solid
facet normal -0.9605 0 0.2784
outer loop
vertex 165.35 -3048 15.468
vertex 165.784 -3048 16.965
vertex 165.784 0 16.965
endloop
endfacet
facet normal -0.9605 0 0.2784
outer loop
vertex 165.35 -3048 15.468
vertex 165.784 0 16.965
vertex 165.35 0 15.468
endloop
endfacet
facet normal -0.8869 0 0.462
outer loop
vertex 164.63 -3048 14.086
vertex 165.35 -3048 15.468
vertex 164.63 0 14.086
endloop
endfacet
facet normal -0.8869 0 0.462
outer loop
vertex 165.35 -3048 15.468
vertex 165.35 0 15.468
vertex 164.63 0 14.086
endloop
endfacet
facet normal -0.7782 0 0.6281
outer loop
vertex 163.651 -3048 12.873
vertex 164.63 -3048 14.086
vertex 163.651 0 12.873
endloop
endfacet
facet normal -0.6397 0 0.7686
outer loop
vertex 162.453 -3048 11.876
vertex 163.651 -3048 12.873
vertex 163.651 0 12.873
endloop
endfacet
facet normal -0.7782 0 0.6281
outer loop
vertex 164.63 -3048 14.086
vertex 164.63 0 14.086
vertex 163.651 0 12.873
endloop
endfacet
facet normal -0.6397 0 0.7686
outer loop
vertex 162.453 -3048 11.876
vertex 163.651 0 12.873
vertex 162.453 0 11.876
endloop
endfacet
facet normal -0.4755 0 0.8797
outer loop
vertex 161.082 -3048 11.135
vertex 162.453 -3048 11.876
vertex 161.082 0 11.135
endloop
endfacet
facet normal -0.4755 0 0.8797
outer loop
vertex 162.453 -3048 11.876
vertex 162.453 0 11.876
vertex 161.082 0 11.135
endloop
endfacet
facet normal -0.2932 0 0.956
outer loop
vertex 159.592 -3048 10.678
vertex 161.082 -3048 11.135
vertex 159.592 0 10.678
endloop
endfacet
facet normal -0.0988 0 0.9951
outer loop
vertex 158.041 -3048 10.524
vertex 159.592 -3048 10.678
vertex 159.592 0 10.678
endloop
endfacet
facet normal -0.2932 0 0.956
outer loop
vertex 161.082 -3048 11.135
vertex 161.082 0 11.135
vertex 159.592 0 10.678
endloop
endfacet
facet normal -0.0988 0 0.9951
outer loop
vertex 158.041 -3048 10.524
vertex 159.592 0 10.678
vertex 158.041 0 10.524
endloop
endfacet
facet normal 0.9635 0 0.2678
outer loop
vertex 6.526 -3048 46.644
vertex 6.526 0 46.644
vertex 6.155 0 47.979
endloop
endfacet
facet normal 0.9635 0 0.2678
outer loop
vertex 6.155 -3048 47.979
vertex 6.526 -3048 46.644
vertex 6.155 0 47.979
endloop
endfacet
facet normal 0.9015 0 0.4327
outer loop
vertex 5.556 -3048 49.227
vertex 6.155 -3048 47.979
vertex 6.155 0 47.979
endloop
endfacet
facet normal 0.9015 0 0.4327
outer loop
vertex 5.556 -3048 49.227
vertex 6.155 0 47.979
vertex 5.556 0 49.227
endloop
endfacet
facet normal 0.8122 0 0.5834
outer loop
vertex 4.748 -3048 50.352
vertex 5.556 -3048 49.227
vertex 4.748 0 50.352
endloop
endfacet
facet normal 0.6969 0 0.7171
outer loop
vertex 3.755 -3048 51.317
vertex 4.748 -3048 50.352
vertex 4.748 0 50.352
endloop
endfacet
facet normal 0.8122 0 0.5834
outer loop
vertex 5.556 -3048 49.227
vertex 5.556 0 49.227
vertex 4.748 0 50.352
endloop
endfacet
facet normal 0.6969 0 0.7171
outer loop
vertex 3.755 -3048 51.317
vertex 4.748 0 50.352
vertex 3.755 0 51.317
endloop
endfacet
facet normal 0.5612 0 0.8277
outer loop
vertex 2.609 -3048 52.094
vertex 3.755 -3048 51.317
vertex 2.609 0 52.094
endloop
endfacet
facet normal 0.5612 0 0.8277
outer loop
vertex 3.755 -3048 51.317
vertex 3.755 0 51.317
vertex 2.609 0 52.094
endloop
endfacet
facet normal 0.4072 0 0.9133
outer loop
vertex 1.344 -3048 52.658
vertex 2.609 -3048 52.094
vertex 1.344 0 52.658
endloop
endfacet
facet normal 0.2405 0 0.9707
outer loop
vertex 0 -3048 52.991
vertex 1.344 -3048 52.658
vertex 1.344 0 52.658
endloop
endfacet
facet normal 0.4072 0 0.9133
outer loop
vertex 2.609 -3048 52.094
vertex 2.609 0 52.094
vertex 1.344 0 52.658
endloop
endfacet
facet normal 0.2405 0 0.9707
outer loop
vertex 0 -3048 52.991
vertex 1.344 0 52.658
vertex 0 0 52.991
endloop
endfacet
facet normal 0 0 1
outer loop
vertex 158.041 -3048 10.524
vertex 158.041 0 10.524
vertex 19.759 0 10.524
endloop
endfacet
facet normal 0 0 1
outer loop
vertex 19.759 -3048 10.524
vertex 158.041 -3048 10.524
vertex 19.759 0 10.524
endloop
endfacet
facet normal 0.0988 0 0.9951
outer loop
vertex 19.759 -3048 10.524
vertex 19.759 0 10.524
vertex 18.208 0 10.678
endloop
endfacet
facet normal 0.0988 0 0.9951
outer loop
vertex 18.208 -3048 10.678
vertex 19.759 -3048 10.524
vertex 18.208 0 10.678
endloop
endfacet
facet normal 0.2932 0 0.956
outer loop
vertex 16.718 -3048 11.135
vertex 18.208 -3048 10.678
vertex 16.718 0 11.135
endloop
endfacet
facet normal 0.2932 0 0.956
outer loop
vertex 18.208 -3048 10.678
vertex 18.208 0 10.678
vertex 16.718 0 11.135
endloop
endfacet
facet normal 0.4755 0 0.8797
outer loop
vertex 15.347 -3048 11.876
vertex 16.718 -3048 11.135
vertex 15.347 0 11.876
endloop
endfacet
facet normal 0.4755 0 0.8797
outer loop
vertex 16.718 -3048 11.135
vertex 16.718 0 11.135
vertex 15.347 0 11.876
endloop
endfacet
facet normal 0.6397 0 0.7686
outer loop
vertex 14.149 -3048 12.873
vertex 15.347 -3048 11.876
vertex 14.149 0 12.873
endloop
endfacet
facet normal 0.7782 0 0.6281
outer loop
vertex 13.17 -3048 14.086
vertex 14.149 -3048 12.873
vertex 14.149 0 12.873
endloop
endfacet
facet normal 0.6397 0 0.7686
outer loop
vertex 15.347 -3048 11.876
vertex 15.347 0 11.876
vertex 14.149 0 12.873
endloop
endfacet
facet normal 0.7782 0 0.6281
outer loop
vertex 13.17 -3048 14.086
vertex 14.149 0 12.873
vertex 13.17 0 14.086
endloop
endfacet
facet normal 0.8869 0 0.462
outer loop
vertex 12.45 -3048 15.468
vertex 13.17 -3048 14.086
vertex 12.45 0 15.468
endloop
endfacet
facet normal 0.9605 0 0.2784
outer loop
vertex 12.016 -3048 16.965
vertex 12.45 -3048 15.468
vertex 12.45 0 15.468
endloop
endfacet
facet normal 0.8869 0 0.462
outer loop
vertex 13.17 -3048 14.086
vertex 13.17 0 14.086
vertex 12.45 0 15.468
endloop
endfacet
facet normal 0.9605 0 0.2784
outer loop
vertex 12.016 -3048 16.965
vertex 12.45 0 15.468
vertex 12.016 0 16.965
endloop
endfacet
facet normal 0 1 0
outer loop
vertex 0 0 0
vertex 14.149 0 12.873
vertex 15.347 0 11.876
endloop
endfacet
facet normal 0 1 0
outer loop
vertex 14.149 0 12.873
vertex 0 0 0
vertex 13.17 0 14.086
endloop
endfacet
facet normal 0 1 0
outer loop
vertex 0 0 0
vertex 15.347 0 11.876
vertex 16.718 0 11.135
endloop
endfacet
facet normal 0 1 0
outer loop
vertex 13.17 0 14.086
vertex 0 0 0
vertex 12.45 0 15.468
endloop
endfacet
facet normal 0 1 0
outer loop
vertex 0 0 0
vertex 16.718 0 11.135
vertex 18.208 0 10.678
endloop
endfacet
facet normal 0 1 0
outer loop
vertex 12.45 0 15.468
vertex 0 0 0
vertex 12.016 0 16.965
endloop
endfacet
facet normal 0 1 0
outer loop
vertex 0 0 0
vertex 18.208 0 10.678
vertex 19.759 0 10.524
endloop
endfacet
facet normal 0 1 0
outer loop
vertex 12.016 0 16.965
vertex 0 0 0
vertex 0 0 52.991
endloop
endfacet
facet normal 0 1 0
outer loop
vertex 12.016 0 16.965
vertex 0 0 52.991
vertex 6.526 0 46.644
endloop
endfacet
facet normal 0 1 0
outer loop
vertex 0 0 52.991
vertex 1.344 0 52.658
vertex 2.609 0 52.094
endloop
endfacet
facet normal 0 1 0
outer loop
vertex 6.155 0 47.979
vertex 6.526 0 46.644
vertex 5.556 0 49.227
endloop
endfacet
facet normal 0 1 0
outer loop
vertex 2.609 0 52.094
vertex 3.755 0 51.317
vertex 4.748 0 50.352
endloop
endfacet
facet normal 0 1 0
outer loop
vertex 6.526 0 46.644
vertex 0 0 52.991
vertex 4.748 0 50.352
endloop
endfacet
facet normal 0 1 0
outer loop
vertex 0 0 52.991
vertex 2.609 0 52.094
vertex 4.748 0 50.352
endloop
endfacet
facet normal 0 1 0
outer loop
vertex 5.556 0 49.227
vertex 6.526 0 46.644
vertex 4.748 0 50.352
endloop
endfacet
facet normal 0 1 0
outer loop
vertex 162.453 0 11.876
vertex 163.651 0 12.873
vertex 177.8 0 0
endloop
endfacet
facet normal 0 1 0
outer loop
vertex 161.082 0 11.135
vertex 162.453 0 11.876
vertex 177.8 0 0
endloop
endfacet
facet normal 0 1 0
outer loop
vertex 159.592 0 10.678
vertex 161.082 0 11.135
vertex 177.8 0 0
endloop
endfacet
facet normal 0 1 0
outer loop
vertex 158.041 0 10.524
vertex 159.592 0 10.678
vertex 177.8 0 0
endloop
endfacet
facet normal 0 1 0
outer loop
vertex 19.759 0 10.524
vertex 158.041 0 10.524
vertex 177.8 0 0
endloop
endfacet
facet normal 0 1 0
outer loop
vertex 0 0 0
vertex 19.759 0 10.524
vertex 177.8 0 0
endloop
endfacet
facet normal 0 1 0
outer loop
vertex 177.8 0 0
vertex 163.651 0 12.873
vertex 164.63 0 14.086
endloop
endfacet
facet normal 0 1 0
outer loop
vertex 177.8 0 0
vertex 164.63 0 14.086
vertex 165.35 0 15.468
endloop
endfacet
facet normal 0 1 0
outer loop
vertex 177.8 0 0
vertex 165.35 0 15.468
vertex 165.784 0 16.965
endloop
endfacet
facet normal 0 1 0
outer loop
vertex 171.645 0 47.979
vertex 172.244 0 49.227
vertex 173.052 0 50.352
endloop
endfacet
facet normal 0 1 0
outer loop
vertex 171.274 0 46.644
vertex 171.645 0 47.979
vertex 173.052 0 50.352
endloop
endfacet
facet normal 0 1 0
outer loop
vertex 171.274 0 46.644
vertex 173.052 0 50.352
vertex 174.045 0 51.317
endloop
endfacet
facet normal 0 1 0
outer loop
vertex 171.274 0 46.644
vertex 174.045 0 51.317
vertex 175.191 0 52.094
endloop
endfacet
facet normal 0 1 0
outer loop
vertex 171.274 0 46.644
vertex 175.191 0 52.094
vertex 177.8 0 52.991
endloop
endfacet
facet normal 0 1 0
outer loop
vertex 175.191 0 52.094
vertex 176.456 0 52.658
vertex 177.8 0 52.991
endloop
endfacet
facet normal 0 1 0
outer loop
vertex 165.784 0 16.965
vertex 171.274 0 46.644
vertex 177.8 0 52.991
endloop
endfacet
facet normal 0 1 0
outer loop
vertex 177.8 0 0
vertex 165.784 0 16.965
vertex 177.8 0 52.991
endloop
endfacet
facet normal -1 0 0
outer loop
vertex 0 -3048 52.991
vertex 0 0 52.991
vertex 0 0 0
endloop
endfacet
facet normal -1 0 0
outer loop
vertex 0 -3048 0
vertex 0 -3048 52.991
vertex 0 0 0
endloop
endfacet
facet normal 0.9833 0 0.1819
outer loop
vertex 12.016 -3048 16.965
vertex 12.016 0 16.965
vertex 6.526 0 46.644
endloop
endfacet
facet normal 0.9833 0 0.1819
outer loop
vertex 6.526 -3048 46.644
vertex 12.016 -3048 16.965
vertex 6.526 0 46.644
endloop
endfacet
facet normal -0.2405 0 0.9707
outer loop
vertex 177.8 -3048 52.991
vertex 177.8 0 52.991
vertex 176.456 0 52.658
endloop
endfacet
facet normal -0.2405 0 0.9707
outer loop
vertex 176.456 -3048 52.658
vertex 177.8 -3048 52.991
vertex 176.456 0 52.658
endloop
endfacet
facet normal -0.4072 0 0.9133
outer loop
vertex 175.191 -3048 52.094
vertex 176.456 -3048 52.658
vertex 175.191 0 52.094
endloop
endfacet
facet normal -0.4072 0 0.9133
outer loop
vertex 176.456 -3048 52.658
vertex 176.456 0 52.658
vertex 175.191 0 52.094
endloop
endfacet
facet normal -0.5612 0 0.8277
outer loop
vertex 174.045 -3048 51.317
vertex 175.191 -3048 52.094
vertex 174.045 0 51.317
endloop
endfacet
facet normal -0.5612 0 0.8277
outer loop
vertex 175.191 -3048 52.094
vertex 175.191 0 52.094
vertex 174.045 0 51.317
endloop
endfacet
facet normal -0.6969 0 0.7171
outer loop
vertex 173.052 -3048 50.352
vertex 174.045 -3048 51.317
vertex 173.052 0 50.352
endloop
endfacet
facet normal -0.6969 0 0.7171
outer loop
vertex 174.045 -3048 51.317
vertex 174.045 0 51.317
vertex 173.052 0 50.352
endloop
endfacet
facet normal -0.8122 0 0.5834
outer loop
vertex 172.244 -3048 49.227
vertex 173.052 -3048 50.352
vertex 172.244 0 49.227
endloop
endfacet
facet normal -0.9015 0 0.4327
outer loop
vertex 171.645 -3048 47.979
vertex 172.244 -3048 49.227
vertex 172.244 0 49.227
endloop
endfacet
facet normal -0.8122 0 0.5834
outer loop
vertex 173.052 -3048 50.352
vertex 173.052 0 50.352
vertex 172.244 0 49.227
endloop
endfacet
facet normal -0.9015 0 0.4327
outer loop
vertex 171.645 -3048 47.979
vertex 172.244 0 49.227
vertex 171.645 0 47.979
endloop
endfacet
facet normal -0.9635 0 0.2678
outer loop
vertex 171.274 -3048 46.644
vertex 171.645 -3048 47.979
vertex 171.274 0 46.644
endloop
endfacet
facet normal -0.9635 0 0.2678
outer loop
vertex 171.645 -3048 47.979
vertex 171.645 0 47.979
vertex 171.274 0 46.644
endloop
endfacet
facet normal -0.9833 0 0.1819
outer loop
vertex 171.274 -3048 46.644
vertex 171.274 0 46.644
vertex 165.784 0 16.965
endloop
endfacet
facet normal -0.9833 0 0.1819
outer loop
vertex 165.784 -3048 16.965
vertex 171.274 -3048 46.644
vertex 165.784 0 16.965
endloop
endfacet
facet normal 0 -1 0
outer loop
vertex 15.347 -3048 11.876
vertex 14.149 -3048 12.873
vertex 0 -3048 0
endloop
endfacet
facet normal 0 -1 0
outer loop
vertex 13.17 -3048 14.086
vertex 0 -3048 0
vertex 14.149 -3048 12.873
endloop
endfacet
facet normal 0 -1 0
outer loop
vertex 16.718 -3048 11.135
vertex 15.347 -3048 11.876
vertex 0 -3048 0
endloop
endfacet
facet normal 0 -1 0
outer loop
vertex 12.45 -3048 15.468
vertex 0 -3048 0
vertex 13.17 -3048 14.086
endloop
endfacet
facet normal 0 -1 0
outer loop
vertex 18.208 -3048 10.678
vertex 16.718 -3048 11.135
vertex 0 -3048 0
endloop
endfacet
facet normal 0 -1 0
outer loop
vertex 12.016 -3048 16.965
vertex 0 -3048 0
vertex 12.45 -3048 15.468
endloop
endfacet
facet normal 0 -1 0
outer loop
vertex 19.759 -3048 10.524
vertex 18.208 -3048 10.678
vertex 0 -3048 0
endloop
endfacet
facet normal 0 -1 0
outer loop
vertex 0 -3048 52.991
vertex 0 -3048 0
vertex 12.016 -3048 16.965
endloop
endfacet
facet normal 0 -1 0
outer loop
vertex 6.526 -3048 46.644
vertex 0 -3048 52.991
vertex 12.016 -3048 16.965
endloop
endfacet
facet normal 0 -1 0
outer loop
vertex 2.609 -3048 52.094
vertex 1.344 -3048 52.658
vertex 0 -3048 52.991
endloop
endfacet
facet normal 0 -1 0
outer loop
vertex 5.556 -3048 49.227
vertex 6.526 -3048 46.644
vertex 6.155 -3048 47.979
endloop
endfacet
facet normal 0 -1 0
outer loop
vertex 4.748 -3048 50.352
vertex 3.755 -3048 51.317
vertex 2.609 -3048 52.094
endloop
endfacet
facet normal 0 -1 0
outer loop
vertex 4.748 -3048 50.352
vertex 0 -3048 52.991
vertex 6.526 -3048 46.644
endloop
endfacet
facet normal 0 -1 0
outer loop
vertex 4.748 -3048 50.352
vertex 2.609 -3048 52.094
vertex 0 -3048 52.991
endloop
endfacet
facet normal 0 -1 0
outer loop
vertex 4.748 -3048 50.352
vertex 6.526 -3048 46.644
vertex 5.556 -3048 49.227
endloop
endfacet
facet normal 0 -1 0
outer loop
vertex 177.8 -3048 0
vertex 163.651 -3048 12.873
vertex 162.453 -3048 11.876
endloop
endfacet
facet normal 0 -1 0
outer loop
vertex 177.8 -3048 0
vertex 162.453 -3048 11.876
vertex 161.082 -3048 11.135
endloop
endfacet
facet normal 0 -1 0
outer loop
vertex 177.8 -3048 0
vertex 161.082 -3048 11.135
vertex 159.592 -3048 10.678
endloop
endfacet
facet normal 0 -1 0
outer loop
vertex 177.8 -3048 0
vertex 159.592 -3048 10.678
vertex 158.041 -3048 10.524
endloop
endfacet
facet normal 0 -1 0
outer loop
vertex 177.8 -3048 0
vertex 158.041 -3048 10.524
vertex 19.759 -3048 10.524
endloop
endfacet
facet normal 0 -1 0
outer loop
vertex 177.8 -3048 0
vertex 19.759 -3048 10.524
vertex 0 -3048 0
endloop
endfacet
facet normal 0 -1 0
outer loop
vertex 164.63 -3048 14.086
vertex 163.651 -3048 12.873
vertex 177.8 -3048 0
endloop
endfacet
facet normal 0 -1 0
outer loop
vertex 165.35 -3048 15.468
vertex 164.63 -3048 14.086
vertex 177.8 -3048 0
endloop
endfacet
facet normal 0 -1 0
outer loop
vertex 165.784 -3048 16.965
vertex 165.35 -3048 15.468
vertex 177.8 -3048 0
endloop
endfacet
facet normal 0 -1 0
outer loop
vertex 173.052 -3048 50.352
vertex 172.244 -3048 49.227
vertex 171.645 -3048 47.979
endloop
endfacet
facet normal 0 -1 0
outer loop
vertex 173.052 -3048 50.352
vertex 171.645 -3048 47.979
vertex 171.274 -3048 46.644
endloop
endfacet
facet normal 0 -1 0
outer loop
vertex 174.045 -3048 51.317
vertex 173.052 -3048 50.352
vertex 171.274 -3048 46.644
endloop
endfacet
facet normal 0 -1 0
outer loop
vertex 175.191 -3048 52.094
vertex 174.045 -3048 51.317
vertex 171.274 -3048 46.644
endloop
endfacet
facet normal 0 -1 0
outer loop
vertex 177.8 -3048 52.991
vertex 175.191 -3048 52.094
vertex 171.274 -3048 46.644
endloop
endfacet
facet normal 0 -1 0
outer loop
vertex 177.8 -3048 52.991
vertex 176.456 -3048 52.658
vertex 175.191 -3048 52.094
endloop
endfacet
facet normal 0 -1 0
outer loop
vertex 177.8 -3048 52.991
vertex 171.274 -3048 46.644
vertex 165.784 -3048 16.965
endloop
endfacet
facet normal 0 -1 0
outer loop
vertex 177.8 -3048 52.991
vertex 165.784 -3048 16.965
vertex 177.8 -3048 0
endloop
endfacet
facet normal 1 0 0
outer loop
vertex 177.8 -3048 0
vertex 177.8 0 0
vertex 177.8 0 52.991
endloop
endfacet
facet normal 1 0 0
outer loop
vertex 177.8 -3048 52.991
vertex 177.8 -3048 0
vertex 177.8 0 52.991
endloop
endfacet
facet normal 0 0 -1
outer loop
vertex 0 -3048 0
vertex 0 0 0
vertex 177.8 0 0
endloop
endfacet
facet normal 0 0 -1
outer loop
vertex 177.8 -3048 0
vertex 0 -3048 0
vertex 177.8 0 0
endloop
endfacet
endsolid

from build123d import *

# Parameters (mm, degrees)
F1_DEPTH = 3048


with BuildPart() as f1:
    # F0 (on Front) → F1 (new body)
    with BuildSketch(Plane.XZ):
        with BuildLine():
            Line((0, 52.991395), (0, 0))
            Line((0, 0), (177.8, 0))
            Line((177.8, 0), (177.8, 52.991395))
            ThreePointArc((177.8, 52.991395), (173.526978, 50.856502), (171.274301, 46.644385))
            Line((171.274301, 46.644385), (165.783699, 16.965456))
            ThreePointArc((165.783699, 16.965456), (163.077015, 12.344805), (158.04108, 10.523841))
            Line((158.04108, 10.523841), (19.75892, 10.523841))
            ThreePointArc((19.75892, 10.523841), (14.722985, 12.344805), (12.016301, 16.965456))
            Line((12.016301, 16.965456), (6.525699, 46.644385))
            ThreePointArc((6.525699, 46.644385), (4.273022, 50.856502), (0, 52.991395))
        make_face()
    extrude(amount=F1_DEPTH)


solid = f1.part
